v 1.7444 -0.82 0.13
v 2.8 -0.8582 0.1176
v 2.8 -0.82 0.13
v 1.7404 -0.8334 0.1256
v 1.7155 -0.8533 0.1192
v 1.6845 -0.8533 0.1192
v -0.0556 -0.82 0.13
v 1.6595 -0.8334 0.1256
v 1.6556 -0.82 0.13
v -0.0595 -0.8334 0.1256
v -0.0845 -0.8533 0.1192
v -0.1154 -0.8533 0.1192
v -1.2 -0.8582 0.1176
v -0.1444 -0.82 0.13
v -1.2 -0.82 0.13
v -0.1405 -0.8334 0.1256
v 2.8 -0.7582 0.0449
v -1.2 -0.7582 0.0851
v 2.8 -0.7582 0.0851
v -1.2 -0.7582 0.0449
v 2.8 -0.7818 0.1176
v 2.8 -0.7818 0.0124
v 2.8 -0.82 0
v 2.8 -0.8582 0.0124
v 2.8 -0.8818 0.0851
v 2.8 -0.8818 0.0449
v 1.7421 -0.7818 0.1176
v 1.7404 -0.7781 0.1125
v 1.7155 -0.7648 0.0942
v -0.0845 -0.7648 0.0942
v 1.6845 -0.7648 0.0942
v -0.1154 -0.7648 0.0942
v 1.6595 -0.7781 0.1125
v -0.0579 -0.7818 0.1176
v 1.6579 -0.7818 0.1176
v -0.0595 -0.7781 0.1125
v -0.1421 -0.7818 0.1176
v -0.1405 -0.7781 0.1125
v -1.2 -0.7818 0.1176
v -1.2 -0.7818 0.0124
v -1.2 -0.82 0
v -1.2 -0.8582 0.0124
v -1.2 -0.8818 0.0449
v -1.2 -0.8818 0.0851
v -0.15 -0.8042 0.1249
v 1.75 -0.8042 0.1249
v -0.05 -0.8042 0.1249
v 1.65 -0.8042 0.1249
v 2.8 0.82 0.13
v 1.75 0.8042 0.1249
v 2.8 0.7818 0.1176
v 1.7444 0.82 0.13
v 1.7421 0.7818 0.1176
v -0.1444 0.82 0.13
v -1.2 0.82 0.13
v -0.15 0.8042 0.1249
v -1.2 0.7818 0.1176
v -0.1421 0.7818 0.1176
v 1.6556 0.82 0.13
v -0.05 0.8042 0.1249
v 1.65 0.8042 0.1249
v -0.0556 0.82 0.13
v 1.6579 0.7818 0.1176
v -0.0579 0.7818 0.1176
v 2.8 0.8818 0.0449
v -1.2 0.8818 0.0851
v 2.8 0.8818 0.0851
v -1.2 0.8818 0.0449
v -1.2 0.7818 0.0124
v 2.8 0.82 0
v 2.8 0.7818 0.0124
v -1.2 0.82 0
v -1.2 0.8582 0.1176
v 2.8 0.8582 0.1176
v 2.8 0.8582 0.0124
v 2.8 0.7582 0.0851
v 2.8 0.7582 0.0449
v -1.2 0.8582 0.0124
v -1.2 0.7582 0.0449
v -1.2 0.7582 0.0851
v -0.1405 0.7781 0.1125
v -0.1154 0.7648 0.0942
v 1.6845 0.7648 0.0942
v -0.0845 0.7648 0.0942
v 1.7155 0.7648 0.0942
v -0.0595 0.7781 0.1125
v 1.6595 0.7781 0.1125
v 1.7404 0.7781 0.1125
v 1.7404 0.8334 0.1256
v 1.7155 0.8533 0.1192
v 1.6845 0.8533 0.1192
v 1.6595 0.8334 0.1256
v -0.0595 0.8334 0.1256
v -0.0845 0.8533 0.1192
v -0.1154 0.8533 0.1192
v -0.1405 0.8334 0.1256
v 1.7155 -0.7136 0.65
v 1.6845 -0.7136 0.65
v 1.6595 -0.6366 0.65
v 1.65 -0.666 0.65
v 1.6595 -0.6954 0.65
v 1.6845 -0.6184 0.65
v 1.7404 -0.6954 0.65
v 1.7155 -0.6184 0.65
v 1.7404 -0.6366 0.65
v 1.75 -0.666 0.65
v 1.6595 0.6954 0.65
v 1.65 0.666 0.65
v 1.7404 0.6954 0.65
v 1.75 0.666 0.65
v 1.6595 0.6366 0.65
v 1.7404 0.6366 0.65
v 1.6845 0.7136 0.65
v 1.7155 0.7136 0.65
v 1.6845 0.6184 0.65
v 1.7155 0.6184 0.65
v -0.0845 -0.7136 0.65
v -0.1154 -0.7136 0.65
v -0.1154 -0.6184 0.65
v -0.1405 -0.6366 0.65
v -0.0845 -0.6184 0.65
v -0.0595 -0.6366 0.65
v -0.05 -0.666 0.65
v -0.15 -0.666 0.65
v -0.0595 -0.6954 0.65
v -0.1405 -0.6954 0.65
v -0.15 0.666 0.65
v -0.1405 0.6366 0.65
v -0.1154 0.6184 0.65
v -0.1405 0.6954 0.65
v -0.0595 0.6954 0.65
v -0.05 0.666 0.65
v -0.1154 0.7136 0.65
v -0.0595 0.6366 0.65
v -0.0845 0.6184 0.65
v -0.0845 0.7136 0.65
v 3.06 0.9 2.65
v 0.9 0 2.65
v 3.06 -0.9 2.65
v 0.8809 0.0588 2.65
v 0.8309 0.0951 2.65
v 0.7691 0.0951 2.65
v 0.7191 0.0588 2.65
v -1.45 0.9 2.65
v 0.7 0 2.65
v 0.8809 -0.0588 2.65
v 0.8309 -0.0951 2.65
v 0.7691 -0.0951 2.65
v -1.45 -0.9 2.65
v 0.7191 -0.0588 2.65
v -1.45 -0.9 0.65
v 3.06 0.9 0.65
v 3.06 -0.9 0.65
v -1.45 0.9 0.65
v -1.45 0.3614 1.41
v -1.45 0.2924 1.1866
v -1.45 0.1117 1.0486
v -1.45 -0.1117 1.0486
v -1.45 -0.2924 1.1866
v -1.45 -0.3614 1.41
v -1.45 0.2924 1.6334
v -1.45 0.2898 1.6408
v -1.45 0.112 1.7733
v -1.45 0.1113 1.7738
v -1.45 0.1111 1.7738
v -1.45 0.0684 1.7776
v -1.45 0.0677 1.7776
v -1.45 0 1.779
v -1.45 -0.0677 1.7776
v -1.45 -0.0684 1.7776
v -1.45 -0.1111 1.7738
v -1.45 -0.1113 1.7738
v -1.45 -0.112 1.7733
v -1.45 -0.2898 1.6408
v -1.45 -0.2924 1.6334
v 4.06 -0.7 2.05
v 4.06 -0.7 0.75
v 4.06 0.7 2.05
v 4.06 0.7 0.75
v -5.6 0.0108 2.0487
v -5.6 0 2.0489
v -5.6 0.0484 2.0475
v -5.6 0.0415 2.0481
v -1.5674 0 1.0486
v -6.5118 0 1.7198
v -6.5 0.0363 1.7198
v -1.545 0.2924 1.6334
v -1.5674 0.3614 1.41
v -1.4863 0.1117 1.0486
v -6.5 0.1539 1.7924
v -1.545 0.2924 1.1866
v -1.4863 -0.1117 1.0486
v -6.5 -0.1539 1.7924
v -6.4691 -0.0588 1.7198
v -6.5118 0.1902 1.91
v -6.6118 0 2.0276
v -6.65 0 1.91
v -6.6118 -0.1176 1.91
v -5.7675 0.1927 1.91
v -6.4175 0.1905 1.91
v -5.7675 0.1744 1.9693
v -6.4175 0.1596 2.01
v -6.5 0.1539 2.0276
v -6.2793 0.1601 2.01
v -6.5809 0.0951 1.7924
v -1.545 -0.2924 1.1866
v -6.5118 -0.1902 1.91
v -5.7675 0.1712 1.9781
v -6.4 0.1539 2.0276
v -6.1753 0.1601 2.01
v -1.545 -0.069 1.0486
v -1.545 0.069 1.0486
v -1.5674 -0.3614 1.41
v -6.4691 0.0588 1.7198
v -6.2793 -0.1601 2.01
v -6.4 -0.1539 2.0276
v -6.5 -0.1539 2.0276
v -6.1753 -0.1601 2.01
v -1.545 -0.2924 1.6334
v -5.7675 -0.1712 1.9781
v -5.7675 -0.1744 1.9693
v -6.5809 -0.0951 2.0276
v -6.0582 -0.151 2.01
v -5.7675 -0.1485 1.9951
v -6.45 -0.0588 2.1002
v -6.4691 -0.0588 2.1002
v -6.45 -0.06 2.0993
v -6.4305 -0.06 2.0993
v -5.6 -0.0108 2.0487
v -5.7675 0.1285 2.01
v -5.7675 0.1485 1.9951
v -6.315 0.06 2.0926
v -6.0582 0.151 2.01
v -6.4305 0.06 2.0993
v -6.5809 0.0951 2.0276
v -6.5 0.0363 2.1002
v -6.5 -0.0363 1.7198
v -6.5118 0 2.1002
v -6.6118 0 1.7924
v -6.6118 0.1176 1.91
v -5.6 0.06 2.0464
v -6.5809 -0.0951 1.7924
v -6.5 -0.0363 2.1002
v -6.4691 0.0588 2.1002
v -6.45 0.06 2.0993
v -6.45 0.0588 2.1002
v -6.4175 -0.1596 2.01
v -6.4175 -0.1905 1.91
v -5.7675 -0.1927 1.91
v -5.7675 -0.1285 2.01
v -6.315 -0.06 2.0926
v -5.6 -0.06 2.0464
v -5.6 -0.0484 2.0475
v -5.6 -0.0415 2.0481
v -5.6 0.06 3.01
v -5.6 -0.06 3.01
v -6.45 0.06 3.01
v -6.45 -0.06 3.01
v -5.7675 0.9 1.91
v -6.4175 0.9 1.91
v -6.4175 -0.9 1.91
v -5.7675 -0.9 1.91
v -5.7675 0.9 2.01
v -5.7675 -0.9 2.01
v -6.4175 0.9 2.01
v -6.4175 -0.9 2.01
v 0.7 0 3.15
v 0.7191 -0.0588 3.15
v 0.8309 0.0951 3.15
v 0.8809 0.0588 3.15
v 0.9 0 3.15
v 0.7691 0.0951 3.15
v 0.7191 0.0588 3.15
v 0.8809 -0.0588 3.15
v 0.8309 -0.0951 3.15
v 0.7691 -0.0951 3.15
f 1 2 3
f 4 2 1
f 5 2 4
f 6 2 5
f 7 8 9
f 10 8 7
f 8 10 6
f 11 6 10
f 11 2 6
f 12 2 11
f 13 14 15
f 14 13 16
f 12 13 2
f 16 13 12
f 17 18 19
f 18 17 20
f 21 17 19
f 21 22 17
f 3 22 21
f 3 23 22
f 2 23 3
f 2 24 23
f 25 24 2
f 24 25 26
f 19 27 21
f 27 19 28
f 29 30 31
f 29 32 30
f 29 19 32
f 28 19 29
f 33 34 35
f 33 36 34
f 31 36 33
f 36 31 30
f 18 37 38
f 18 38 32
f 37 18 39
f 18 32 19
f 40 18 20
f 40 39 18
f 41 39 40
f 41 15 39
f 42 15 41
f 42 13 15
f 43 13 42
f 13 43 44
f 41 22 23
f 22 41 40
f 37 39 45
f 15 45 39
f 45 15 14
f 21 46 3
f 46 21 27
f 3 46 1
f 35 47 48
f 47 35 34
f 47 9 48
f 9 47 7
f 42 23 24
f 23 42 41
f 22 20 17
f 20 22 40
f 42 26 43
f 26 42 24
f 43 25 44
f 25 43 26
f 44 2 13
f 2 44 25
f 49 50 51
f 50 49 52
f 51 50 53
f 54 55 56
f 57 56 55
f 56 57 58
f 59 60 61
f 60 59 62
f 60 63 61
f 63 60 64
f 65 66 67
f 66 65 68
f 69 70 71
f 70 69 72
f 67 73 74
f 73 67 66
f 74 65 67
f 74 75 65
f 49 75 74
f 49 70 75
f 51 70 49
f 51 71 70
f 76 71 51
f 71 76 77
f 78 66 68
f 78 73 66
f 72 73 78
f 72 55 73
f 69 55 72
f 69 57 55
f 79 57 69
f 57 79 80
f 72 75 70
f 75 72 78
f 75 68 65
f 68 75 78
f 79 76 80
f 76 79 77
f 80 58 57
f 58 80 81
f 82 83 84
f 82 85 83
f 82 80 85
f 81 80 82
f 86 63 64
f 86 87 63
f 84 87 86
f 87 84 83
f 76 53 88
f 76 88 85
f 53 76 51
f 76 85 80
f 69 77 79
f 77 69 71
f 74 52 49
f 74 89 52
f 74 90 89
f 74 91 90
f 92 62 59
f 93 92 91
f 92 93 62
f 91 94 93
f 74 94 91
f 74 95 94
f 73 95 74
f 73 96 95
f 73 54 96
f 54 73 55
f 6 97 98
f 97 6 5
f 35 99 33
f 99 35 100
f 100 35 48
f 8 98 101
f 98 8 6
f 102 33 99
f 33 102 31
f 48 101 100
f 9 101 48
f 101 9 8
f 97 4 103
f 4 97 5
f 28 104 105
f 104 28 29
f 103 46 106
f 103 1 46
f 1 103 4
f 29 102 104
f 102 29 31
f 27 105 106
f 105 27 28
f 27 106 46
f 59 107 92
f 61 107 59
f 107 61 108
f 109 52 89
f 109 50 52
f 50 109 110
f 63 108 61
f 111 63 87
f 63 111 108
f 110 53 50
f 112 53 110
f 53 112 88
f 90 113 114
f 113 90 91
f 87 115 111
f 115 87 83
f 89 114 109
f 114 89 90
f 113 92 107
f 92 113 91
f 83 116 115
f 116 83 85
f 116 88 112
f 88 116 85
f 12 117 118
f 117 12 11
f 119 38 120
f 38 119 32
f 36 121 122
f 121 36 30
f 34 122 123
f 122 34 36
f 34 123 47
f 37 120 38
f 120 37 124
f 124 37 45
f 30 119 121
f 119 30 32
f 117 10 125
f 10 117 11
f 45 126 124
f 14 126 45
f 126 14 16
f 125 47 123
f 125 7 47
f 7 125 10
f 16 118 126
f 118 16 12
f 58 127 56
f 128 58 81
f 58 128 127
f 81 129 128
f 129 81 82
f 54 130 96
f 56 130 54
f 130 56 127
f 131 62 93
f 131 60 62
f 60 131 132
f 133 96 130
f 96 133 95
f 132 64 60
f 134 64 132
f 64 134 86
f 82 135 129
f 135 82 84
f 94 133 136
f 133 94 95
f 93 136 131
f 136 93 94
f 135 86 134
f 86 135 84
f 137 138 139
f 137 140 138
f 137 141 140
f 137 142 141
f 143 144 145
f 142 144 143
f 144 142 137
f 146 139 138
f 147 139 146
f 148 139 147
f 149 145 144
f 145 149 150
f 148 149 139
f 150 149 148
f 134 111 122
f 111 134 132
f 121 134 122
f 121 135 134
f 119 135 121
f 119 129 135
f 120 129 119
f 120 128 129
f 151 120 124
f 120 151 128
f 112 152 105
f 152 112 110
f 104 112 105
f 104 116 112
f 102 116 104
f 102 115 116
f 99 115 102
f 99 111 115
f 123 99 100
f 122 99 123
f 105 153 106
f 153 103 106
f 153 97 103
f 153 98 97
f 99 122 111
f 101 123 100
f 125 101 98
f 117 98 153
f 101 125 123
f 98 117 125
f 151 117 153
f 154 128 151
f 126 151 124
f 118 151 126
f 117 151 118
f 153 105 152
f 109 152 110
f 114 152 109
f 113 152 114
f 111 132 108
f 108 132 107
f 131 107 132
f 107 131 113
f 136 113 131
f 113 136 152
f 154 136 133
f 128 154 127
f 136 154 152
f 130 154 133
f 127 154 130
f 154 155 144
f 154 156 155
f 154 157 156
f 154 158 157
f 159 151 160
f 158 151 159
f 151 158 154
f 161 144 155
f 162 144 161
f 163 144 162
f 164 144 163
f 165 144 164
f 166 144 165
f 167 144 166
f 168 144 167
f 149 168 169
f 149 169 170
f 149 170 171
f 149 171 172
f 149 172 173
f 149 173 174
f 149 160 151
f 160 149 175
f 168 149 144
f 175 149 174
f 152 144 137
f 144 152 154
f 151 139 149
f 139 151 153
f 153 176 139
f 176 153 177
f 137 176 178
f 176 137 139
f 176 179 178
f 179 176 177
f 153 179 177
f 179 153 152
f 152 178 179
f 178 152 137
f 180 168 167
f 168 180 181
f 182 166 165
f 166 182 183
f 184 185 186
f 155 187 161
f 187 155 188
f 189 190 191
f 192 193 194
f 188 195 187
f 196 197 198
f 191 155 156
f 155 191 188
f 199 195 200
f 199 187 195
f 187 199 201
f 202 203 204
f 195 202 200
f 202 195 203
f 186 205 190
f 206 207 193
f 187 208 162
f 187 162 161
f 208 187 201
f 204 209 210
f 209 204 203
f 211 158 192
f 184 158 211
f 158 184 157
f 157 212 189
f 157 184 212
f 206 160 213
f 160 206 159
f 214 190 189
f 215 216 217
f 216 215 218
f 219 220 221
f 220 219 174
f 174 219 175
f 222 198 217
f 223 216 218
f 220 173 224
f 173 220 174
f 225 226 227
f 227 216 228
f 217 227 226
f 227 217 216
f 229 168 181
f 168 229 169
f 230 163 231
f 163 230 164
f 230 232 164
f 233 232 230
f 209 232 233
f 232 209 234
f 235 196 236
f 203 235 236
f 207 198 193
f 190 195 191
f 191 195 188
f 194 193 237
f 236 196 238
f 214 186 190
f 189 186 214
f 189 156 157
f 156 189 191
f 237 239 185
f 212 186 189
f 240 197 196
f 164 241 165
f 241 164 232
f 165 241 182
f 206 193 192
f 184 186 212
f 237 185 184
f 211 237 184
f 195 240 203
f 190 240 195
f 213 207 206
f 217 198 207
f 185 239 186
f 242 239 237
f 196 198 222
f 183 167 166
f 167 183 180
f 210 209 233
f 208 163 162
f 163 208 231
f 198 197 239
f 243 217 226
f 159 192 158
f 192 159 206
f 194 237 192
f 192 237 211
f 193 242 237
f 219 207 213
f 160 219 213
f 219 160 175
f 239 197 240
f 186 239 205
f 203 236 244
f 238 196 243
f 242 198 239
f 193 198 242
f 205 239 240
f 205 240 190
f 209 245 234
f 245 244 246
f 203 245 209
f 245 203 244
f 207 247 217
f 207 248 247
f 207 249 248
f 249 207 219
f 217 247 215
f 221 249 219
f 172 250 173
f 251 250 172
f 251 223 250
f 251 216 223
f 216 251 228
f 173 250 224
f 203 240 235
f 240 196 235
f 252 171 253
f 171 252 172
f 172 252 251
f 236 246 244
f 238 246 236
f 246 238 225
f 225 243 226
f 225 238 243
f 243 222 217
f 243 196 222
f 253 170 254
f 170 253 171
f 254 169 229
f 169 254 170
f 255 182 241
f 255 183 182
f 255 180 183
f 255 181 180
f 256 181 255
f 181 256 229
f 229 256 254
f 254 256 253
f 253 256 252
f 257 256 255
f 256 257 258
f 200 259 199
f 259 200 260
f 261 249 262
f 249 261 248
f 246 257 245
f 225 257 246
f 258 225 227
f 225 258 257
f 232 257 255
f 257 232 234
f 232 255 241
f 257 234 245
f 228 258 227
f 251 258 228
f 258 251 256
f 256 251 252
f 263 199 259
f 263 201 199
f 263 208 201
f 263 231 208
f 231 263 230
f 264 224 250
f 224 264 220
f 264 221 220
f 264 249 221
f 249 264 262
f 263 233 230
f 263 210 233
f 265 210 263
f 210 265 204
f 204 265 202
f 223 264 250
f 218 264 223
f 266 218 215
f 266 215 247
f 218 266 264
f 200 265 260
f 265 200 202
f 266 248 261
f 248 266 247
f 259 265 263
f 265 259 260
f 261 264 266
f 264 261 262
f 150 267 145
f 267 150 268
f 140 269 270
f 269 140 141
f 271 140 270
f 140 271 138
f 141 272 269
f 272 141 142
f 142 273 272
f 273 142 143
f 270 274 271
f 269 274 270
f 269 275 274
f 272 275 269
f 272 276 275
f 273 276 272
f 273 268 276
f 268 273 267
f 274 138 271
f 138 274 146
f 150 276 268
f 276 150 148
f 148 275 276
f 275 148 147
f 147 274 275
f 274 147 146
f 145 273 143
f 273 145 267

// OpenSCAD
// Helicopter body — static parts only. Main and tail rotors are separate
// animated parts declared via MOGUL_META part echoes below.
//
// Conventions: see helicopter.scad / models-src/README.md.

$fn = 10;

// ── Dimensions (keep in sync with helicopter_main_rotor.scad and
//    helicopter_tail_rotor.scad) ────────────────────────────────────────────

body_cx = 0.8;
body_l  = 4.5;
body_w  = 1.8;
body_h  = 2.0;
body_z  = 0.65;

nose_l  = 1.0;
nose_w  = 1.4;
nose_h  = 1.3;

boom_l    = 5.0;
boom_r1   = 0.38;
boom_r2   = 0.20;
boom_rise = 0.50;

fin_h   = 1.10;
fin_l   = 0.85;
fin_thk = 0.12;

stab_span = 1.8;
stab_l    = 0.65;
stab_thk  = 0.10;

skid_l = 4.0;
skid_r = 0.065;
skid_y = 0.82;
strut_r = 0.05;

mast_h = 0.50;
mast_r = 0.10;

// Derived
body_front = body_cx + body_l / 2;
body_rear  = body_cx - body_l / 2;
body_top   = body_z  + body_h;
boom_end_x = body_rear - boom_l;
boom_z_fwd = body_z + body_h * 0.38;
boom_z_end = boom_z_fwd + boom_rise;
mast_top   = body_top + mast_h;

// Tail rotor hub position (must match helicopter_tail_rotor.scad)
tr_x = boom_end_x + fin_l * 0.50;
tr_y = fin_thk / 2 + 0.06;
tr_z = boom_z_end + fin_h * 0.65;

// ── Animated part declarations ─────────────────────────────────────────────
// scad2obj reads these and emits "# part <name> <axis> <x> <y> <z>" in the
// OBJ header (game-space coordinates). The renderer loads <name>.obj and
// positions one instance per helicopter at body_pos + rotY(heading)*offset.
echo("MOGUL_META", "part", "helicopter_main_rotor", "spin_y", body_cx, 0, mast_top);
echo("MOGUL_META", "part", "helicopter_tail_rotor", "spin_z", tr_x, tr_y, tr_z);

// ── Modules ────────────────────────────────────────────────────────────────

module skids() {
    color([0.18, 0.18, 0.20])
    for (s = [-1, 1])
        translate([body_cx, s * skid_y, skid_r])
            rotate([0, 90, 0])
                cylinder(h = skid_l, r = skid_r, center = true);
}

module struts() {
    color([0.22, 0.22, 0.24])
    for (sx = [0.9, -0.9])
        for (s = [-1, 1])
            hull() {
                translate([body_cx + sx, s * body_w * 0.37, body_z])
                    sphere(r = strut_r);
                translate([body_cx + sx, s * skid_y, skid_r])
                    sphere(r = strut_r);
            }
}

module fuselage() {
    color([0.85, 0.12, 0.10])
    translate([body_cx, 0, body_z + body_h / 2])
        cube([body_l, body_w, body_h], center = true);
}

module nose() {
    color([0.85, 0.12, 0.10])
    hull() {
        translate([body_front, 0, body_z + body_h / 2])
            cube([0.02, body_w, body_h], center = true);
        translate([body_front + nose_l, 0, body_z + body_h / 2 - 0.25])
            cube([0.02, nose_w, nose_h], center = true);
    }
}

module windshield() {
    color([0.06, 0.10, 0.20])
    hull() {
        translate([body_front + 0.02, 0, body_z + body_h * 0.60])
            cube([0.02, body_w * 0.72, body_h * 0.36], center = true);
        translate([body_front + nose_l * 0.65, 0, body_z + body_h * 0.40])
            cube([0.02, nose_w * 0.70, nose_h * 0.45], center = true);
    }
}

module tail_boom() {
    color([0.78, 0.10, 0.08])
    hull() {
        translate([body_rear, 0, boom_z_fwd])
            sphere(r = boom_r1);
        translate([boom_end_x, 0, boom_z_end])
            sphere(r = boom_r2);
    }
}

module tail_fin() {
    fin_cx = boom_end_x + fin_l / 2;
    fin_cz = boom_z_end + fin_h / 2;
    color([0.72, 0.10, 0.08])
        translate([fin_cx, 0, fin_cz])
            cube([fin_l, fin_thk, fin_h], center = true);
}

module horizontal_stab() {
    stab_cx = boom_end_x + stab_l * 0.55;
    stab_cz = boom_z_end + 0.05;
    color([0.72, 0.10, 0.08])
        translate([stab_cx, 0, stab_cz])
            cube([stab_l, stab_span, stab_thk], center = true);
}

module rotor_mast() {
    color([0.28, 0.28, 0.30])
    translate([body_cx, 0, body_top])
        cylinder(h = mast_h, r = mast_r);
}

// ── Assembly ───────────────────────────────────────────────────────────────
skids();
struts();
fuselage();
nose();
windshield();
tail_boom();
tail_fin();
horizontal_stab();
rotor_mast();
